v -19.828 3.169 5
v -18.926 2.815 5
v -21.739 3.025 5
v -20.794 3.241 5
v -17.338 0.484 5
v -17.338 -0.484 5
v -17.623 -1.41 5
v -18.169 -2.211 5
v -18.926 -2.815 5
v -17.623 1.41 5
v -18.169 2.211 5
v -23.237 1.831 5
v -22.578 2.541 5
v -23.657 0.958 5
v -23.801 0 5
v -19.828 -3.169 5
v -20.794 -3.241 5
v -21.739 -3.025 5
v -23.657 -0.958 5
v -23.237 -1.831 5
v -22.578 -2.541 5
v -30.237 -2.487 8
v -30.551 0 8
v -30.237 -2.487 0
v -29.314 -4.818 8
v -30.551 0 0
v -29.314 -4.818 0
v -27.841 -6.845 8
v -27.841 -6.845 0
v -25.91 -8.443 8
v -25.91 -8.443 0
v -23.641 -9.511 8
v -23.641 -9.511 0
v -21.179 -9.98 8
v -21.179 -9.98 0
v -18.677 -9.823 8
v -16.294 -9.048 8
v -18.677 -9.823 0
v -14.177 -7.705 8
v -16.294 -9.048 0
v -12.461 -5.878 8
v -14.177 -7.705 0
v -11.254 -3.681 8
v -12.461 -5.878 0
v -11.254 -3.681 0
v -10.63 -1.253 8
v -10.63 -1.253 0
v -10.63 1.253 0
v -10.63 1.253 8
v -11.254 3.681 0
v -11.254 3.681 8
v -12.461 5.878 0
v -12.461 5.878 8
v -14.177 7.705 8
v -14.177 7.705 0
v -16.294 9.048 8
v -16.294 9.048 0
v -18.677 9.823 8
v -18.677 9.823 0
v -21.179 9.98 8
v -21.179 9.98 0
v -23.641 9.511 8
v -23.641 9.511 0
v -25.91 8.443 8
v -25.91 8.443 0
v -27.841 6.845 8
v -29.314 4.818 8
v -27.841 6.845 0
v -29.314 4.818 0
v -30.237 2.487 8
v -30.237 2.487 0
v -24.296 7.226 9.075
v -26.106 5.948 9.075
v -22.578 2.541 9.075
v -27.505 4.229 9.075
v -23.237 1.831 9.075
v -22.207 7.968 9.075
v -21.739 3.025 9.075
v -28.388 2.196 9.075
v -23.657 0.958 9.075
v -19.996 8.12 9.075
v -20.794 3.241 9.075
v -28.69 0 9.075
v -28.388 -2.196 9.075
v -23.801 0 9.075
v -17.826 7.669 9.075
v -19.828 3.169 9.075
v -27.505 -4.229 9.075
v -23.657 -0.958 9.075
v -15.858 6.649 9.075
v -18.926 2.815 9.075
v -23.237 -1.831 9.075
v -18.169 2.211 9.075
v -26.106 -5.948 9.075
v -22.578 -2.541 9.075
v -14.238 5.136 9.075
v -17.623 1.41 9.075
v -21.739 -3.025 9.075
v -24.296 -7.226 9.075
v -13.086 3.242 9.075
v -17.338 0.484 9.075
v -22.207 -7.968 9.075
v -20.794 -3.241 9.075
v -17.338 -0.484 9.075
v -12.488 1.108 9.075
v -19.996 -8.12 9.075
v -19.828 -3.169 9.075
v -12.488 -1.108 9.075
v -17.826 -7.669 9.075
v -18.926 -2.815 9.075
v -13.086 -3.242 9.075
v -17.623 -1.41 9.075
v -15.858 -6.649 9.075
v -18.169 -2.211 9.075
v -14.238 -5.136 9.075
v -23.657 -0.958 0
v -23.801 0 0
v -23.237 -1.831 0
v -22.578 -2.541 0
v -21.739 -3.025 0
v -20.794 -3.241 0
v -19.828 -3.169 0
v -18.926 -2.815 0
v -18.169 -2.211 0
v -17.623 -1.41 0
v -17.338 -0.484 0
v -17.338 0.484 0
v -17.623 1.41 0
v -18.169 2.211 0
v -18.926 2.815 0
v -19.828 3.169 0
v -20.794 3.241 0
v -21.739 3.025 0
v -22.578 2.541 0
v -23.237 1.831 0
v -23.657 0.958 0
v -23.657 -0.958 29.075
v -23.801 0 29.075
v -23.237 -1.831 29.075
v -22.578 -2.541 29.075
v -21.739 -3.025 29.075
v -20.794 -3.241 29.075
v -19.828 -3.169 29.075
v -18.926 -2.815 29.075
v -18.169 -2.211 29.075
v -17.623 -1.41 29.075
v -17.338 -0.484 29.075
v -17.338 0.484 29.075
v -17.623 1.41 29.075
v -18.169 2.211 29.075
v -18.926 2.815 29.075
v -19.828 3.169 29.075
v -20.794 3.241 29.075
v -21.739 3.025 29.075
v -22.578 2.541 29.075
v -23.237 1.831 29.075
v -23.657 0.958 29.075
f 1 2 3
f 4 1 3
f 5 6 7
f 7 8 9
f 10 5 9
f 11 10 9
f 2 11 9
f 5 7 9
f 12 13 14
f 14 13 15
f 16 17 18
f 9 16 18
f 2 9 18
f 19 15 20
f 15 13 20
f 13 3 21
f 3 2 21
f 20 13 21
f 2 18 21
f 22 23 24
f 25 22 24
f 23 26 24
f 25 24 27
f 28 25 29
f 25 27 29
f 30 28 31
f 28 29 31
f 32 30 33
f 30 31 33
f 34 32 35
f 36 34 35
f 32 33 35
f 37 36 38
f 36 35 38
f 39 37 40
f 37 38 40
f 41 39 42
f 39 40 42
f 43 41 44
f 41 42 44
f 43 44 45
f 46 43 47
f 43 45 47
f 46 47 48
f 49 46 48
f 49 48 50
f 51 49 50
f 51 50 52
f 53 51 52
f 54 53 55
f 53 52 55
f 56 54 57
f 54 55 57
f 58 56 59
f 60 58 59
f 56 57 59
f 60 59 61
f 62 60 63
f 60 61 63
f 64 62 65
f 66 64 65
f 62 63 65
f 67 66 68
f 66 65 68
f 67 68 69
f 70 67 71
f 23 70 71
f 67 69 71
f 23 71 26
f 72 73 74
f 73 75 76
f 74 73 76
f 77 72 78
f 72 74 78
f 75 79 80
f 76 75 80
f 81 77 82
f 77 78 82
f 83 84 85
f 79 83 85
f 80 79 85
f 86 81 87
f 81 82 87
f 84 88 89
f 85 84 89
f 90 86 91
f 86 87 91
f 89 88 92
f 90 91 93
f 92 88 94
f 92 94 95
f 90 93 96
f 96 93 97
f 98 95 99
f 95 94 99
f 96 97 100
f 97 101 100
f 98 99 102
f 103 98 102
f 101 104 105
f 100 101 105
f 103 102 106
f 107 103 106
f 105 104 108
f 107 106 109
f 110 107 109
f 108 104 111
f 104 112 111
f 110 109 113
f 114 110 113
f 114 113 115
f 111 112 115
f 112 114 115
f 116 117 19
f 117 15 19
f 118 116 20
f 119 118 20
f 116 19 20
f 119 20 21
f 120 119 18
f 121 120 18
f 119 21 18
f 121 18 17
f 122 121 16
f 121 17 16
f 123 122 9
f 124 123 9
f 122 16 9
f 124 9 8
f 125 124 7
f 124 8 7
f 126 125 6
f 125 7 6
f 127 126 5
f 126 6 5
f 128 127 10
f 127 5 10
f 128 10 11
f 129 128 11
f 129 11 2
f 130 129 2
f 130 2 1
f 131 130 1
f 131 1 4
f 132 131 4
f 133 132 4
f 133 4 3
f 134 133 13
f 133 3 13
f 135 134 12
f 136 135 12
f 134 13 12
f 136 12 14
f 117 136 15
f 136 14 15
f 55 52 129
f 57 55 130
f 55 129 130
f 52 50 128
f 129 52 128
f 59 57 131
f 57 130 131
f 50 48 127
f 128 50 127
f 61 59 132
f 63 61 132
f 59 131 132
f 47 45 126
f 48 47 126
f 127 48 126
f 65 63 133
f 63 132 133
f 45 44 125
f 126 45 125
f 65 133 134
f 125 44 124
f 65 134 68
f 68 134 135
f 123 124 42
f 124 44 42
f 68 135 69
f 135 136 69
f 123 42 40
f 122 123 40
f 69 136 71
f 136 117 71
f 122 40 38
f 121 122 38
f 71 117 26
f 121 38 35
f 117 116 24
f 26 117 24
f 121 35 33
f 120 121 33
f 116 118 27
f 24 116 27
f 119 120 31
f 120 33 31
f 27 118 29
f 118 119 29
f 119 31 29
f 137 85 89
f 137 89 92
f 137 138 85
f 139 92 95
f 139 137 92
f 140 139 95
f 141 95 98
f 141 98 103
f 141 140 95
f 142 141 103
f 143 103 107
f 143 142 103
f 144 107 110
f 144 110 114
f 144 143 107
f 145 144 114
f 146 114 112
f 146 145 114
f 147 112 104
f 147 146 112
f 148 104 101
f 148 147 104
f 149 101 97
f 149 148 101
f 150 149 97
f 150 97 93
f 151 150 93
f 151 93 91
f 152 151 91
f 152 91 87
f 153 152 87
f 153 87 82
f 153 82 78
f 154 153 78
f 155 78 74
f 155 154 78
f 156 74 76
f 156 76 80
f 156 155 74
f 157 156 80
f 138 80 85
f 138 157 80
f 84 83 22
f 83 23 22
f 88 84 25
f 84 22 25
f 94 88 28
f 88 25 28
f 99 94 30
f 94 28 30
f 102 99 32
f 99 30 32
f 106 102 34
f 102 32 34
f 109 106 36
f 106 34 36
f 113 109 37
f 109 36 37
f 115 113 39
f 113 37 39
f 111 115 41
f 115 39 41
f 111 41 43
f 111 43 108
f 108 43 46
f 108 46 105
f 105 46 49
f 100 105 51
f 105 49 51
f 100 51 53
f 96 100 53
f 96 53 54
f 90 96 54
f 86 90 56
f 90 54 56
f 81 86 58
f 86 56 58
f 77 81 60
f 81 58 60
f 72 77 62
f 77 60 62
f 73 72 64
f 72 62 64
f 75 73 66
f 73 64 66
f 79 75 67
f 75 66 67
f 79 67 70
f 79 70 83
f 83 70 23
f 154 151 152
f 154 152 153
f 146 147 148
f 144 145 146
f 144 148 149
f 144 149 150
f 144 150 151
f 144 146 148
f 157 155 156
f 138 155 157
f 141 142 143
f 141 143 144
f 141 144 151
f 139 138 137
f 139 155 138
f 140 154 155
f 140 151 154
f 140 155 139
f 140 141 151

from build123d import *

# Parameters (mm, degrees)
F0_W   = 3.25
F0_H   = 20
F0_H_2 = 3
F0_H_3 = 1.0746234533


with BuildPart() as f1:
    # F0 (on Front) → F1 (revolve)
    with BuildSketch(Plane.XZ):
        with Locations((-22.1763077103, 19.0746234533)):
            Rectangle(F0_W, F0_H)
        Polygon((-23.8013077103, 8), (-30.5513077103, 8), (-30.5513077103, 0), (-23.8013077103, 0), (-23.8013077103, 5), align=None)
        Polygon((-28.6900052902, 9.0746234533), (-30.5513077103, 8), (-23.8013077103, 8), (-23.8013077103, 9.0746234533), align=None)
        with Locations((-22.1763077103, 6.5)):
            Rectangle(F0_W, F0_H_2)
        with Locations((-22.1763077103, 8.5373117267)):
            Rectangle(F0_W, F0_H_3)
    revolve(axis=Axis((-20.5513077103, 0, 19.0746234533), (0, 0, 1)))


solid = f1.part
